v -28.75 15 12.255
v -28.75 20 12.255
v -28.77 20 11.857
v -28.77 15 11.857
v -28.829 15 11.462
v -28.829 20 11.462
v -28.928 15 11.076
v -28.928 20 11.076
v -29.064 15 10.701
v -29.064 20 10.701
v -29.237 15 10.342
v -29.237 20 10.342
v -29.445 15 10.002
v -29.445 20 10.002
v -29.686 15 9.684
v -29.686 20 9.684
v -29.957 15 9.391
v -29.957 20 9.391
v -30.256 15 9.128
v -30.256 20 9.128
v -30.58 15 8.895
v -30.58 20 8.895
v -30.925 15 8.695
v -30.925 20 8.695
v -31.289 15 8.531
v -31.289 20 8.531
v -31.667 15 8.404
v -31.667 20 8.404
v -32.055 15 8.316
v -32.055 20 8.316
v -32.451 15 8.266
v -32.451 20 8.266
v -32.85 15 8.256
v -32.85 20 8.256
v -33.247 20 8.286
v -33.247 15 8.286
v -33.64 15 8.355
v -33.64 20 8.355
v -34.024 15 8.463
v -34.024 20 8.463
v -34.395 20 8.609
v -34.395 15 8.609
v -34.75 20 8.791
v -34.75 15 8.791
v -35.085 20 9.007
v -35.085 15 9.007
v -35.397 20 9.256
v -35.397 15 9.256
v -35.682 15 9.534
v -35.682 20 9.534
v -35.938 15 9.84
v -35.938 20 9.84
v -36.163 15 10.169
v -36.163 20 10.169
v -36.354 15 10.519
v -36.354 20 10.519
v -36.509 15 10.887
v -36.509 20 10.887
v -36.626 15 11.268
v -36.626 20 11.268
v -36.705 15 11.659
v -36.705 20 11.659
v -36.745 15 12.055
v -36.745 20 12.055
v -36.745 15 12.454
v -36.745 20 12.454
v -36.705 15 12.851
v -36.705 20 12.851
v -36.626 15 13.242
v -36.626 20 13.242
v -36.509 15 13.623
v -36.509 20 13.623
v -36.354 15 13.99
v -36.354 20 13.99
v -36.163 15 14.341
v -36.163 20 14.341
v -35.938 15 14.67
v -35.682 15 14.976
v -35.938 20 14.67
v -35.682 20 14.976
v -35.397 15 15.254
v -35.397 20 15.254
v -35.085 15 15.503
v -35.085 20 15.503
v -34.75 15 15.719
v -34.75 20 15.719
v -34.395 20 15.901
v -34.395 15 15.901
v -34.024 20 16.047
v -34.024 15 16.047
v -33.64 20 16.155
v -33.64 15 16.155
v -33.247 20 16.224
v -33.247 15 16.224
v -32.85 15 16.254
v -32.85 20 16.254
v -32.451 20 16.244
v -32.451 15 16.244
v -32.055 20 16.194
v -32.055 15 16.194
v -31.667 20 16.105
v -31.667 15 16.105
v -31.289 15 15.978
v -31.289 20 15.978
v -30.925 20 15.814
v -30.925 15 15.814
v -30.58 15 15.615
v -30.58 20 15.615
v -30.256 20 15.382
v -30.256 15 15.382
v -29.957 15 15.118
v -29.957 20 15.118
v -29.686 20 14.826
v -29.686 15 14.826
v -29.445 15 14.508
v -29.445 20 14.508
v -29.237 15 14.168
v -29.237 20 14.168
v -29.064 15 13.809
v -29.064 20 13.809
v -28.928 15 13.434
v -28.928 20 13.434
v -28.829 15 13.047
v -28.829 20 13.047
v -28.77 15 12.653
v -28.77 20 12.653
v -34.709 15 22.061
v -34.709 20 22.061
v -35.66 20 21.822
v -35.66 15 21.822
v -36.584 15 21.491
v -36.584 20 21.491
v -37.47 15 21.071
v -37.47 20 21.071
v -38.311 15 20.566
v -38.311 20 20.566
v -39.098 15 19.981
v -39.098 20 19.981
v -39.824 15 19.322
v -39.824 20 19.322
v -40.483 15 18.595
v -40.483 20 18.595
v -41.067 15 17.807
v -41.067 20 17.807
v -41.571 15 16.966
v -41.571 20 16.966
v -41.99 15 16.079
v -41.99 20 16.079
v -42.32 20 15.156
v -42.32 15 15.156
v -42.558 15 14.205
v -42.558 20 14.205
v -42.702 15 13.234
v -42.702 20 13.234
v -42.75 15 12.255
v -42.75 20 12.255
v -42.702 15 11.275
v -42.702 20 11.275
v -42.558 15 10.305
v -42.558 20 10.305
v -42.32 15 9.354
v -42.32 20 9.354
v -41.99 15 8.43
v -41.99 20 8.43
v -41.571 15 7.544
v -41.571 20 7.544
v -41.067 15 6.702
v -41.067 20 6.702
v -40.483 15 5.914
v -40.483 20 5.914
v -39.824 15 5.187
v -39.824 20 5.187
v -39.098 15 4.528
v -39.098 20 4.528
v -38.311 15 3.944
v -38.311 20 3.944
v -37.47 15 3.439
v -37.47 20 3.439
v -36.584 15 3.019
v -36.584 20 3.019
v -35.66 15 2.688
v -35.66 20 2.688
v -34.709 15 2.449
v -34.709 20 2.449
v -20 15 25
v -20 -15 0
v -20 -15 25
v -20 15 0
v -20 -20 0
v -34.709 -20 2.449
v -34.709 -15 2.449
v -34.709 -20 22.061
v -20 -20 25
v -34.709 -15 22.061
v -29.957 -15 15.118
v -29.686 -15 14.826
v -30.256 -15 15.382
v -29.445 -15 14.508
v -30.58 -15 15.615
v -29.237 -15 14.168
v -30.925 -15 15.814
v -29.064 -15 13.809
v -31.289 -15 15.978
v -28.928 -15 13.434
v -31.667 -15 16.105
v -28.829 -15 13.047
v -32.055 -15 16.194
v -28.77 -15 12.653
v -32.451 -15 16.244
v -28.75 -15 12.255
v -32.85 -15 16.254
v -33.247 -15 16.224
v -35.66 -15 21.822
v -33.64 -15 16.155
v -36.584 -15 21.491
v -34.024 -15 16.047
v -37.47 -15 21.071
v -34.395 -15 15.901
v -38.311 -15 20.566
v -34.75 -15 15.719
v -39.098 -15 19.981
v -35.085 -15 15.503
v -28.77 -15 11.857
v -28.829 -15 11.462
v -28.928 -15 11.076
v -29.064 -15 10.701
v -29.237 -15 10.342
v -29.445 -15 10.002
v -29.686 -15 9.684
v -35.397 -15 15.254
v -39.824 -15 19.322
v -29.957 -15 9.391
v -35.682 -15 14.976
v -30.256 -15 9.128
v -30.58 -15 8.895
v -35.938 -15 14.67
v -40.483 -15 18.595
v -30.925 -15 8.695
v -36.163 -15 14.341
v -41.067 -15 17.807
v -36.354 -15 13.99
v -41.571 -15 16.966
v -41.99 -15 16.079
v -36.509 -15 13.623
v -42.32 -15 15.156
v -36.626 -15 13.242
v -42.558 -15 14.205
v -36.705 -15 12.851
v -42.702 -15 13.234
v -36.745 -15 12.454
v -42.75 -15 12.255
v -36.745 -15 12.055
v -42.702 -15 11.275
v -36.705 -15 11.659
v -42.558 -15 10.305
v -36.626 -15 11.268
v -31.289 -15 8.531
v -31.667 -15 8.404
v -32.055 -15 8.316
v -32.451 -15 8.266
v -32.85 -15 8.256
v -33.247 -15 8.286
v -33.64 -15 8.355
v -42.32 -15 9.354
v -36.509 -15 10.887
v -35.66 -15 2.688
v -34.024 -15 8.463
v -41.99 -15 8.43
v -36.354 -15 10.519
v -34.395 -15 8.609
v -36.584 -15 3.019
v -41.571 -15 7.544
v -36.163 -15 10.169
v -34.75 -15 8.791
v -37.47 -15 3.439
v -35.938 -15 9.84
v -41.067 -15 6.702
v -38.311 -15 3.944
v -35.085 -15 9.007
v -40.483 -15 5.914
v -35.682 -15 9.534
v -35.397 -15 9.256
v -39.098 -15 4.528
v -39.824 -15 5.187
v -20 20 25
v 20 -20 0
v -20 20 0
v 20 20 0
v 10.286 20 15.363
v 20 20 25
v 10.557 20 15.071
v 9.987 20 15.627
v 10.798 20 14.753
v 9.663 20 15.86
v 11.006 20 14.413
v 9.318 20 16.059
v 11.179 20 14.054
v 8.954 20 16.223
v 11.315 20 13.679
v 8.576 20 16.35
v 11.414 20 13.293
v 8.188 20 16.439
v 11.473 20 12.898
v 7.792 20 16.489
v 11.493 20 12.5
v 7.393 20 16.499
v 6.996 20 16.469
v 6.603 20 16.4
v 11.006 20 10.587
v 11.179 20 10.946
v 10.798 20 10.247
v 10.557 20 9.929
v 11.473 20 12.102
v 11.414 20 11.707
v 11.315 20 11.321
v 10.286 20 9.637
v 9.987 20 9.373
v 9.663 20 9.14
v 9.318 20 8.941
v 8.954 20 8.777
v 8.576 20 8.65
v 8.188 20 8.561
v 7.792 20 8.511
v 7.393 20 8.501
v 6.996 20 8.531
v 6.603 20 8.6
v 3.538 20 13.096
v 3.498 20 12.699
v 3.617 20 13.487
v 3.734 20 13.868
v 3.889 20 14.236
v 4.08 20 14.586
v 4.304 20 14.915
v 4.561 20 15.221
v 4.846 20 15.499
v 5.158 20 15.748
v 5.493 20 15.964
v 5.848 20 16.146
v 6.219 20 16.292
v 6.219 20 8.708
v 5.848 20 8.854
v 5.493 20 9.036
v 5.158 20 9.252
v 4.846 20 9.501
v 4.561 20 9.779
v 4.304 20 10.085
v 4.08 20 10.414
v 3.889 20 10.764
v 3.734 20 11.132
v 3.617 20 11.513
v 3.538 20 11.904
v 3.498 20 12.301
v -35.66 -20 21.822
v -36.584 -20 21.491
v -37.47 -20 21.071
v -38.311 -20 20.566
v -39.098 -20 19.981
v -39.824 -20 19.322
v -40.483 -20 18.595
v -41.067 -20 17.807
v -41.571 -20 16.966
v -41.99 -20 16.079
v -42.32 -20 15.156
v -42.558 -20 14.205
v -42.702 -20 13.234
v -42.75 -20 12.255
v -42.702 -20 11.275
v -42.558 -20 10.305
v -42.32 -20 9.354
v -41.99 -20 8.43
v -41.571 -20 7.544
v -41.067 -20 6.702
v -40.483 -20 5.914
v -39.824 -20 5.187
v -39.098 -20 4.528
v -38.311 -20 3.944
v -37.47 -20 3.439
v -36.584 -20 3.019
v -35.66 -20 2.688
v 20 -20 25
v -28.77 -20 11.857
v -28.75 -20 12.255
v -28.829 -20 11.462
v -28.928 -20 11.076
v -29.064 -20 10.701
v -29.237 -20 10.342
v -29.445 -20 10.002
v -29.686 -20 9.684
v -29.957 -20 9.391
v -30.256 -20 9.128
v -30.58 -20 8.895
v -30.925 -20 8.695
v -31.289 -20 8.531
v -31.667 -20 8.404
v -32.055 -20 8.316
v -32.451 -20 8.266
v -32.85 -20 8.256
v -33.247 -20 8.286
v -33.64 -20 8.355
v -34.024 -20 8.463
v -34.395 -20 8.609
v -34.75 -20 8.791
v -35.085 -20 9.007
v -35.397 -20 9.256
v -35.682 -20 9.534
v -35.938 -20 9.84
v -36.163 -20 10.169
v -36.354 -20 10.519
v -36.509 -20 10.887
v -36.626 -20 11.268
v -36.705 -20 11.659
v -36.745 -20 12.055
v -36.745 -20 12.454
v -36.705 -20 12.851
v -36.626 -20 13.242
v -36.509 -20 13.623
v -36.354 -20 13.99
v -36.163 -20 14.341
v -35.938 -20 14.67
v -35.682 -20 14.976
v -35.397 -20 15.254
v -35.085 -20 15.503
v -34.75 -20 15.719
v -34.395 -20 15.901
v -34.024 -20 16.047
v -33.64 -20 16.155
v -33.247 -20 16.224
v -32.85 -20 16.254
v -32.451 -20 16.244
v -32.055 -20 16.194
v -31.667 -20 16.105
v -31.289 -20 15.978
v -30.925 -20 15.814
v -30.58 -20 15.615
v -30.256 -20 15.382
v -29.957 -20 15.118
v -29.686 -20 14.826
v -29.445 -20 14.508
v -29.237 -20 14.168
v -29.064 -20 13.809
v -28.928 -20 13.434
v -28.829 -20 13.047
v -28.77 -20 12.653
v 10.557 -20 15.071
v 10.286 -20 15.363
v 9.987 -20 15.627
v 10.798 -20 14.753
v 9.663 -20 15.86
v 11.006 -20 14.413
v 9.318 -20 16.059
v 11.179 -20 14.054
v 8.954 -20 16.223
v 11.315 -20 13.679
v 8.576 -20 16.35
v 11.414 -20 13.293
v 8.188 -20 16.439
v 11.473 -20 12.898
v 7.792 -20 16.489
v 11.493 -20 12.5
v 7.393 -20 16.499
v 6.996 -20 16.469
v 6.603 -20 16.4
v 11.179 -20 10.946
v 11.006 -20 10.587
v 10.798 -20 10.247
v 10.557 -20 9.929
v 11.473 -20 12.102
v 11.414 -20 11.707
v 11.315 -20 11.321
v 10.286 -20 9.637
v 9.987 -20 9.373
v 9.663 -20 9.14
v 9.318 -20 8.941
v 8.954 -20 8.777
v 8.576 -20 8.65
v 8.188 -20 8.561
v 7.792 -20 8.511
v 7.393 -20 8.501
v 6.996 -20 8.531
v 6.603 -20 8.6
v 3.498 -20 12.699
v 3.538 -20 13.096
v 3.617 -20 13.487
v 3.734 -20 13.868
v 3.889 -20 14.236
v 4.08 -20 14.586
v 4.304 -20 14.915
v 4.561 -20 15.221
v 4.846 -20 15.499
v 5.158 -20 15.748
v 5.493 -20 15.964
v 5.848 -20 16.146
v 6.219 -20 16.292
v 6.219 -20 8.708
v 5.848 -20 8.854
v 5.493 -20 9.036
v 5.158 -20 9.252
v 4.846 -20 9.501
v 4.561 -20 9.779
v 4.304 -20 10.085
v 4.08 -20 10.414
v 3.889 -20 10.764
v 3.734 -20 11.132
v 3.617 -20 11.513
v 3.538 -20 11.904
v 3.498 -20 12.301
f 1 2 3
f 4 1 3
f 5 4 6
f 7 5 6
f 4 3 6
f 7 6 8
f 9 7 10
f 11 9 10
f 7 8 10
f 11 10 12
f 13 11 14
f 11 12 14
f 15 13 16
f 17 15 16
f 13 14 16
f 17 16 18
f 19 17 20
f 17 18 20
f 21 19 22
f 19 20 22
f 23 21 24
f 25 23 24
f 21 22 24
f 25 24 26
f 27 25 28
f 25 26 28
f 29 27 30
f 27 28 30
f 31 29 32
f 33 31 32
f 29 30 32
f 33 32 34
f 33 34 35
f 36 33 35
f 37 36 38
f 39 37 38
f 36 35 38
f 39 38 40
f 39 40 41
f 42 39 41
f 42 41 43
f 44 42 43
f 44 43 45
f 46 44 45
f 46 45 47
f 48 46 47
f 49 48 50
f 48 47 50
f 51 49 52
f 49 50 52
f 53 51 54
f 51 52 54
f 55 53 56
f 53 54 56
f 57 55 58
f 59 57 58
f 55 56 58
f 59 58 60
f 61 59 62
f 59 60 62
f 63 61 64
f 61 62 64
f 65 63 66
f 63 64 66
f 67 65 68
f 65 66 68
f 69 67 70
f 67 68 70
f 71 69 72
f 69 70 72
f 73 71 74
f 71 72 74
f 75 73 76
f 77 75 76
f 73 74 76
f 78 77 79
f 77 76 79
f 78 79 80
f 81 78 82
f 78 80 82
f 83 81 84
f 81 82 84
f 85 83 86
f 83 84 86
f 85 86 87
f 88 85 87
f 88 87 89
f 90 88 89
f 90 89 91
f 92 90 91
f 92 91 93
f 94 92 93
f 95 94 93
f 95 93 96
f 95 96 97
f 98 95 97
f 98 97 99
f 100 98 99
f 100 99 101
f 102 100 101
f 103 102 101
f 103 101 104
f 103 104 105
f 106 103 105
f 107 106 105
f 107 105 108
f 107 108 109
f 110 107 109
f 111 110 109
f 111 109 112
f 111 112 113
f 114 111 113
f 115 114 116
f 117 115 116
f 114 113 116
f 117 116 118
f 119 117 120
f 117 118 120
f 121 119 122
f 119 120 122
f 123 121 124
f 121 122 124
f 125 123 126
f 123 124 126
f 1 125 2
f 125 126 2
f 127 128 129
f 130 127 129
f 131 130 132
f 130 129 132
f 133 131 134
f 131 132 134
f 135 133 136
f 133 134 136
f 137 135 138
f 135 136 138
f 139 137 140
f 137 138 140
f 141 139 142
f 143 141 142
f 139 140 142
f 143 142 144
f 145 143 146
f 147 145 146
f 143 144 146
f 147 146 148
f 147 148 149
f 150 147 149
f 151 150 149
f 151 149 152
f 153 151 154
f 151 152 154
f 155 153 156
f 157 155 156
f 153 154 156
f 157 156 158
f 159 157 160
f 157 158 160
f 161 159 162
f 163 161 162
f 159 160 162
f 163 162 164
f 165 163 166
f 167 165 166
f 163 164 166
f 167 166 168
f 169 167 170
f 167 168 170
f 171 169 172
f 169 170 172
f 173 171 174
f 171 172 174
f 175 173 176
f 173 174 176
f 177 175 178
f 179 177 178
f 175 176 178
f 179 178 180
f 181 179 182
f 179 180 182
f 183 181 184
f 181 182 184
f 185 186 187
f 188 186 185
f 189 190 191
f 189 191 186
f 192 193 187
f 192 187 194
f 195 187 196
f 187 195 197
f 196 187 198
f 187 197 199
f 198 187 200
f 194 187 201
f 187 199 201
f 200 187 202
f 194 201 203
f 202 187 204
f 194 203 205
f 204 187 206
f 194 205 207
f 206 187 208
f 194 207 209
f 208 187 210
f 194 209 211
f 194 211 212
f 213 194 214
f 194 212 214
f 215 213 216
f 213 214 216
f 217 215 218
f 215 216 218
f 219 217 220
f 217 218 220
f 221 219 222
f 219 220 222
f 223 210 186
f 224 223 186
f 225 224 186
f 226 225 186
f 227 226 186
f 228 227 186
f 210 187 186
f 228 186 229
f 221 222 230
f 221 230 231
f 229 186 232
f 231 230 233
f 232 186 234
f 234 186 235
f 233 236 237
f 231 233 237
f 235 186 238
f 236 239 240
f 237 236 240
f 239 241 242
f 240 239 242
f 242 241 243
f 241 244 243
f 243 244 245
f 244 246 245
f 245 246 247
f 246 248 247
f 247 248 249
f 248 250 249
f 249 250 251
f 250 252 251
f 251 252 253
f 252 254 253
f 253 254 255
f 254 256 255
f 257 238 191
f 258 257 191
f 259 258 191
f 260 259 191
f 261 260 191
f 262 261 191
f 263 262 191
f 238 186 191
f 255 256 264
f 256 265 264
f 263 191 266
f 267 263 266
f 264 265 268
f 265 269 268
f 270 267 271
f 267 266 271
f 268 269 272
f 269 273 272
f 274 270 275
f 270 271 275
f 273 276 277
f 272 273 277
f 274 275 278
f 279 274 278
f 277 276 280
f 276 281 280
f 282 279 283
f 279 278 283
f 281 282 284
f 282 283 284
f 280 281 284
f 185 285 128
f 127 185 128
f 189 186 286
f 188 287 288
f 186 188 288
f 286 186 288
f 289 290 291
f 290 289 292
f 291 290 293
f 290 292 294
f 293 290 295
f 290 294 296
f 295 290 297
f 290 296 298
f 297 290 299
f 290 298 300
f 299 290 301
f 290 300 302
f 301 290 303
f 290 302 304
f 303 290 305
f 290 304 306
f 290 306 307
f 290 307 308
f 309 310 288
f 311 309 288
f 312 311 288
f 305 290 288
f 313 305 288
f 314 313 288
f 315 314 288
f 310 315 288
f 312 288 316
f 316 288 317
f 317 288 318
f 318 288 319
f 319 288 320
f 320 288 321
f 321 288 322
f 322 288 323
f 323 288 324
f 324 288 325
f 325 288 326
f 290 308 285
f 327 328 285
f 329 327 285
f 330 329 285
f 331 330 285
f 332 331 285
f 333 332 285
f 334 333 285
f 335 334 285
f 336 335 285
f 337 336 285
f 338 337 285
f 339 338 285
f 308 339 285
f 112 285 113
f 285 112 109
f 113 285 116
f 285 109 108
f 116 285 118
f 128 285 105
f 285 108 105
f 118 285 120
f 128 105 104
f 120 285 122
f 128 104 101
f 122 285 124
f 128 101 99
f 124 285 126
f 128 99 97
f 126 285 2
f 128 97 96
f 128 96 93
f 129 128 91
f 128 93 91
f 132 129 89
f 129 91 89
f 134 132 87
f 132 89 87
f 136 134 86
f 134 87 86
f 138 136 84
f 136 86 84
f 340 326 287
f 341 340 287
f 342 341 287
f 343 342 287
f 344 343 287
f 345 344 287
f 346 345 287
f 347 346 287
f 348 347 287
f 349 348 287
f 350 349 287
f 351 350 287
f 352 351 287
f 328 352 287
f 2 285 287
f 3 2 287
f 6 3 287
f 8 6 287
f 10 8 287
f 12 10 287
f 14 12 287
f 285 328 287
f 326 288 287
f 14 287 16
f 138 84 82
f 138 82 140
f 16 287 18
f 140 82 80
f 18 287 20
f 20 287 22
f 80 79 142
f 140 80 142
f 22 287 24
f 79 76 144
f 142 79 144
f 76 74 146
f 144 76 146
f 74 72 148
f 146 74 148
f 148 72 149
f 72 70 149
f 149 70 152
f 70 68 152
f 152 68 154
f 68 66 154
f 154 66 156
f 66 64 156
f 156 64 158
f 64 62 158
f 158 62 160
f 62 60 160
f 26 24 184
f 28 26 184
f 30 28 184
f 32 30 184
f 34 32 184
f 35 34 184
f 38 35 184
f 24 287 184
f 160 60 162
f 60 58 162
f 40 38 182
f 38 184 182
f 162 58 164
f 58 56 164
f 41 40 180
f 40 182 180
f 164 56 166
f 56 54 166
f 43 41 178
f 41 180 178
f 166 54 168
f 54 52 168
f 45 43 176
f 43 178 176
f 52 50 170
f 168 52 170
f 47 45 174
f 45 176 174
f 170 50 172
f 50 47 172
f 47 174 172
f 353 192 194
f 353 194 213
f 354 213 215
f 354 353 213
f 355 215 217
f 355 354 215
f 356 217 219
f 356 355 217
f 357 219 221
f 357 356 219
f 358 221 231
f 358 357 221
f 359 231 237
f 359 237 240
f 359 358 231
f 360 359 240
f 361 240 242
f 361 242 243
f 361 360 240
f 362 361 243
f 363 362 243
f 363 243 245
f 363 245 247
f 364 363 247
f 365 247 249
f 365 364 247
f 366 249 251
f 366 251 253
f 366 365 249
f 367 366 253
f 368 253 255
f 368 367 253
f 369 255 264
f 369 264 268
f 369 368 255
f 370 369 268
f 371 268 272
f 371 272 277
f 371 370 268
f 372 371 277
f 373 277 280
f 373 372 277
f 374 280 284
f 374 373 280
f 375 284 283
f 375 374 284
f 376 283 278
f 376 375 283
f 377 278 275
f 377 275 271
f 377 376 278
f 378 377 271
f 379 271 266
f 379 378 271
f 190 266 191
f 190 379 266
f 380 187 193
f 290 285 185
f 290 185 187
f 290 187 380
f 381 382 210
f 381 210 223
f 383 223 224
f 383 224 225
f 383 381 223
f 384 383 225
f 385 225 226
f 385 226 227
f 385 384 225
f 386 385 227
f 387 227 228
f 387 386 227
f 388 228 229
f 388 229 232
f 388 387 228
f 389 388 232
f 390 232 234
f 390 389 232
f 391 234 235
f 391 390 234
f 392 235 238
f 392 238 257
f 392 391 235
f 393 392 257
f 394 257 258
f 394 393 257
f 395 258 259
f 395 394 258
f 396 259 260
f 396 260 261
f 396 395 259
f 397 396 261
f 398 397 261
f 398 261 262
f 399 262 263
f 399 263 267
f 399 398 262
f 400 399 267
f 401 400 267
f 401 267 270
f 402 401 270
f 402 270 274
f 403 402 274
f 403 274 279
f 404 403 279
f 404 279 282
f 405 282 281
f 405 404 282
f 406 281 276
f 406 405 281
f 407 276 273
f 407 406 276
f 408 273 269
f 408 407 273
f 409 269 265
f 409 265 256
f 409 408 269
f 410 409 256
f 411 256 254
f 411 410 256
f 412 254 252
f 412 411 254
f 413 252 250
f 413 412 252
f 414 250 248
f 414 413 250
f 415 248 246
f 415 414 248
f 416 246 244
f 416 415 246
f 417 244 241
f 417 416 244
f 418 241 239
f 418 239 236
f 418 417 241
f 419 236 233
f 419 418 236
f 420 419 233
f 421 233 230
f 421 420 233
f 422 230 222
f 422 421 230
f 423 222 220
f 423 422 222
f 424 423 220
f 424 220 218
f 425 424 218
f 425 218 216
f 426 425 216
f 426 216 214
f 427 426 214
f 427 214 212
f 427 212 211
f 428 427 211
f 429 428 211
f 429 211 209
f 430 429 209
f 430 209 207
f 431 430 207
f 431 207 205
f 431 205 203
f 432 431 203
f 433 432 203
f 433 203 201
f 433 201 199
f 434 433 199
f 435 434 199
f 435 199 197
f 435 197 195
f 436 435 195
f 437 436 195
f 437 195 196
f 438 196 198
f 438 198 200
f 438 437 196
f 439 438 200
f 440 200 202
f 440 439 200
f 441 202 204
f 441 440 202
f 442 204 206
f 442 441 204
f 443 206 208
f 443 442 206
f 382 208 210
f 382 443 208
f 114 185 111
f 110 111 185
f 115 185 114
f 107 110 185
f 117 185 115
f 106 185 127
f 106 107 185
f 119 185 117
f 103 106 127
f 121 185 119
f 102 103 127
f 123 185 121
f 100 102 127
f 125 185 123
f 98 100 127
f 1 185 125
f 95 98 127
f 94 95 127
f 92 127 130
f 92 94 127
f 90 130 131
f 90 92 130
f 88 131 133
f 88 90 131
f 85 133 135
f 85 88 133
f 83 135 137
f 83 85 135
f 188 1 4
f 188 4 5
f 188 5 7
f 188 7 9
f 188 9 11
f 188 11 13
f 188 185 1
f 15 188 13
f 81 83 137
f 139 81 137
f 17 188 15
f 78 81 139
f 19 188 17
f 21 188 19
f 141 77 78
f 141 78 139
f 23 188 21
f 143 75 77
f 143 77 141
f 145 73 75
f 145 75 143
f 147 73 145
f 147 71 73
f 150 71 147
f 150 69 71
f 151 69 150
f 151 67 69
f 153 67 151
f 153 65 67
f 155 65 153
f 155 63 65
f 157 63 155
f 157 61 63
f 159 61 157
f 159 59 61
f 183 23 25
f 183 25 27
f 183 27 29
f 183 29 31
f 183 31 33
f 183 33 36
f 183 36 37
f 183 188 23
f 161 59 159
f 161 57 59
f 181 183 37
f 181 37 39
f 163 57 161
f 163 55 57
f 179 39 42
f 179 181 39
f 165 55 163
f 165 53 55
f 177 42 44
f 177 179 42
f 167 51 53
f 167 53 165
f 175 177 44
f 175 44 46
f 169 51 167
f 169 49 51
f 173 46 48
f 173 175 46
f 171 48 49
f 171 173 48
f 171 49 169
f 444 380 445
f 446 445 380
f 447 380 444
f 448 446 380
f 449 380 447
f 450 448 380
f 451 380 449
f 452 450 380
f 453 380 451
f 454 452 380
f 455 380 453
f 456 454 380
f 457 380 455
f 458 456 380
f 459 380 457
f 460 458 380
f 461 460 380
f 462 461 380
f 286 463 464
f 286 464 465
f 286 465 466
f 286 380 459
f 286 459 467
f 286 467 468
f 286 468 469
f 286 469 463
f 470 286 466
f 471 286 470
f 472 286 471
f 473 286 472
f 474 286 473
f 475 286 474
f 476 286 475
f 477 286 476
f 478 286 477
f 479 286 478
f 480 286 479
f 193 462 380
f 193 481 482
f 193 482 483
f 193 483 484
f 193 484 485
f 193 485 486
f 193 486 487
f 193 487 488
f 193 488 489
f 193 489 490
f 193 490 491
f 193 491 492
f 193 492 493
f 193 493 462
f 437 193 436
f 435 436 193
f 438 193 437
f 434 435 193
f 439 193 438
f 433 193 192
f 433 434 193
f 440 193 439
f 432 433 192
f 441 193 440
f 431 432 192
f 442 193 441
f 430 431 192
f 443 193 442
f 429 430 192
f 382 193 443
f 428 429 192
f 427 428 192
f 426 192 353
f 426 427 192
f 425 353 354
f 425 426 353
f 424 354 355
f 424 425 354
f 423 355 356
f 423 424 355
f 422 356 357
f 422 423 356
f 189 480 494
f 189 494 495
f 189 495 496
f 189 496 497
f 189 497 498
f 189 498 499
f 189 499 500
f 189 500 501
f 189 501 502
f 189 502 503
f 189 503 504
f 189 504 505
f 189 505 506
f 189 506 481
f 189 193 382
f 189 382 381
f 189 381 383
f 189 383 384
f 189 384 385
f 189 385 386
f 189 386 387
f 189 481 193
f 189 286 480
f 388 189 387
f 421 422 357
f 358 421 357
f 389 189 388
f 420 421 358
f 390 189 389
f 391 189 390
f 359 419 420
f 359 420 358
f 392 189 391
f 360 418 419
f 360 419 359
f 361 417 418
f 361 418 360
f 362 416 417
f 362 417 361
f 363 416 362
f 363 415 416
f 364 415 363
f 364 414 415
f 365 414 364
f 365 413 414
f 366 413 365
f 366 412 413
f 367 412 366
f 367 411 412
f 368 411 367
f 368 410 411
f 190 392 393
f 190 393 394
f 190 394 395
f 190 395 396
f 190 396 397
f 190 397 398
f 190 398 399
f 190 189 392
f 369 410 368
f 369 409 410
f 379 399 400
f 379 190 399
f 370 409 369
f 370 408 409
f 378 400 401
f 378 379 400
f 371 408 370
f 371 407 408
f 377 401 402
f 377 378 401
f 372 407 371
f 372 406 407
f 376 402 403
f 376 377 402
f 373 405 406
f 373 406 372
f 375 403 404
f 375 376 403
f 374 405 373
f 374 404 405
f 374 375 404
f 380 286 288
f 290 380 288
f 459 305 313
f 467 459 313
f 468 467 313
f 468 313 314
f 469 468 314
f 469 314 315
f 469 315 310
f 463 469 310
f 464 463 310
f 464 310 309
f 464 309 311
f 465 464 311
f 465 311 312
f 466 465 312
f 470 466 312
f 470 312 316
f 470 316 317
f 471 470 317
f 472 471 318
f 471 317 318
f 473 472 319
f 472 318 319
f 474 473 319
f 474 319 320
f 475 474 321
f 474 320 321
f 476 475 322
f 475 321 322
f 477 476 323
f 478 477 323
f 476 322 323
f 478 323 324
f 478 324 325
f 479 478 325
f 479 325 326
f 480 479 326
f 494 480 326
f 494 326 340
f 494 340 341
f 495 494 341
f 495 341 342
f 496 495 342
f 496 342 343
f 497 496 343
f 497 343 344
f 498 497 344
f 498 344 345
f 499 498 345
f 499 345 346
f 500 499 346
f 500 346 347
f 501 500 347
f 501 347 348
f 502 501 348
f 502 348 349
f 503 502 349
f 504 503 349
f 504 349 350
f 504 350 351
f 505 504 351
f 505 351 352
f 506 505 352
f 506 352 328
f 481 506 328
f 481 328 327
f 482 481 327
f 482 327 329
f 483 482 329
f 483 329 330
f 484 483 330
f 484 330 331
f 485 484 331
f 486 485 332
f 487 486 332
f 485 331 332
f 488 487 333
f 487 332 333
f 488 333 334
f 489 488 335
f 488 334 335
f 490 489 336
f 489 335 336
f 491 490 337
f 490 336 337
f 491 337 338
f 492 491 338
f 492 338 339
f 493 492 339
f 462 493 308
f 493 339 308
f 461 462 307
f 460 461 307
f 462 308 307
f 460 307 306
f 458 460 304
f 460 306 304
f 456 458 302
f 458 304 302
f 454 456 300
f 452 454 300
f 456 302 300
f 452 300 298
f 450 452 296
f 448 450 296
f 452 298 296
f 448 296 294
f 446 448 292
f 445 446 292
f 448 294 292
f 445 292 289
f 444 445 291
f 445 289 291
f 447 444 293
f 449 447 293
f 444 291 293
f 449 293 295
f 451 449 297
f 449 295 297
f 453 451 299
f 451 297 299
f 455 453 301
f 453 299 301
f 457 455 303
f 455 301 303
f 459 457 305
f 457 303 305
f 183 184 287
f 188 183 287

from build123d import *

# Parameters (mm, degrees)
ESQUISSE1_W             = 40
ESQUISSE1_H             = 40
BOSS_EXTRU_1_DEPTH      = 25
ESQUISSE2_R             = 4
ENL_V_MAT_EXTRU_1_DEPTH = 47
ESQUISSE4_R             = 4
BOSS_EXTRU_3_DEPTH      = 5


with BuildPart() as part:
    # Esquisse1 → Boss.-Extru.1 (new body)
    with BuildSketch(Plane.XY):
        Rectangle(ESQUISSE1_W, ESQUISSE1_H)
    extrude(amount=BOSS_EXTRU_1_DEPTH)

    # Esquisse2 → Enlèv. mat.-Extru.1 (cut)
    with BuildSketch(Plane(origin=(0, 20, 0), x_dir=(1, 0, 0), z_dir=(0, 1, 0))):
        with Locations((7.492941833, -12.5)):
            Circle(ESQUISSE2_R)
    extrude(amount=-ENL_V_MAT_EXTRU_1_DEPTH, mode=Mode.SUBTRACT)

    # Esquisse4 → Boss.-Extru.3 (add)
    with BuildSketch(Plane(origin=(0, 20, 0), x_dir=(1, 0, 0), z_dir=(0, 1, 0))):
        with BuildLine():
            Line((-20, -25), (-34.7092612, -22.061014641))
            ThreePointArc((-34.7092612, -22.061014641), (-42.749937628, -12.254840508), (-34.7092612, -2.448666374))
            Line((-34.7092612, -2.448666374), (-20, 0))
            Line((-20, 0), (-20, -25))
        make_face()
        with Locations((-32.749937628, -12.254840508)):
            Circle(ESQUISSE4_R, mode=Mode.SUBTRACT)
    boss_extru_3 = extrude(amount=-BOSS_EXTRU_3_DEPTH)

    # Symétrie2: Boss.-Extru.3 across plane
    add(boss_extru_3.mirror(Plane.ZX))


solid = part.part
